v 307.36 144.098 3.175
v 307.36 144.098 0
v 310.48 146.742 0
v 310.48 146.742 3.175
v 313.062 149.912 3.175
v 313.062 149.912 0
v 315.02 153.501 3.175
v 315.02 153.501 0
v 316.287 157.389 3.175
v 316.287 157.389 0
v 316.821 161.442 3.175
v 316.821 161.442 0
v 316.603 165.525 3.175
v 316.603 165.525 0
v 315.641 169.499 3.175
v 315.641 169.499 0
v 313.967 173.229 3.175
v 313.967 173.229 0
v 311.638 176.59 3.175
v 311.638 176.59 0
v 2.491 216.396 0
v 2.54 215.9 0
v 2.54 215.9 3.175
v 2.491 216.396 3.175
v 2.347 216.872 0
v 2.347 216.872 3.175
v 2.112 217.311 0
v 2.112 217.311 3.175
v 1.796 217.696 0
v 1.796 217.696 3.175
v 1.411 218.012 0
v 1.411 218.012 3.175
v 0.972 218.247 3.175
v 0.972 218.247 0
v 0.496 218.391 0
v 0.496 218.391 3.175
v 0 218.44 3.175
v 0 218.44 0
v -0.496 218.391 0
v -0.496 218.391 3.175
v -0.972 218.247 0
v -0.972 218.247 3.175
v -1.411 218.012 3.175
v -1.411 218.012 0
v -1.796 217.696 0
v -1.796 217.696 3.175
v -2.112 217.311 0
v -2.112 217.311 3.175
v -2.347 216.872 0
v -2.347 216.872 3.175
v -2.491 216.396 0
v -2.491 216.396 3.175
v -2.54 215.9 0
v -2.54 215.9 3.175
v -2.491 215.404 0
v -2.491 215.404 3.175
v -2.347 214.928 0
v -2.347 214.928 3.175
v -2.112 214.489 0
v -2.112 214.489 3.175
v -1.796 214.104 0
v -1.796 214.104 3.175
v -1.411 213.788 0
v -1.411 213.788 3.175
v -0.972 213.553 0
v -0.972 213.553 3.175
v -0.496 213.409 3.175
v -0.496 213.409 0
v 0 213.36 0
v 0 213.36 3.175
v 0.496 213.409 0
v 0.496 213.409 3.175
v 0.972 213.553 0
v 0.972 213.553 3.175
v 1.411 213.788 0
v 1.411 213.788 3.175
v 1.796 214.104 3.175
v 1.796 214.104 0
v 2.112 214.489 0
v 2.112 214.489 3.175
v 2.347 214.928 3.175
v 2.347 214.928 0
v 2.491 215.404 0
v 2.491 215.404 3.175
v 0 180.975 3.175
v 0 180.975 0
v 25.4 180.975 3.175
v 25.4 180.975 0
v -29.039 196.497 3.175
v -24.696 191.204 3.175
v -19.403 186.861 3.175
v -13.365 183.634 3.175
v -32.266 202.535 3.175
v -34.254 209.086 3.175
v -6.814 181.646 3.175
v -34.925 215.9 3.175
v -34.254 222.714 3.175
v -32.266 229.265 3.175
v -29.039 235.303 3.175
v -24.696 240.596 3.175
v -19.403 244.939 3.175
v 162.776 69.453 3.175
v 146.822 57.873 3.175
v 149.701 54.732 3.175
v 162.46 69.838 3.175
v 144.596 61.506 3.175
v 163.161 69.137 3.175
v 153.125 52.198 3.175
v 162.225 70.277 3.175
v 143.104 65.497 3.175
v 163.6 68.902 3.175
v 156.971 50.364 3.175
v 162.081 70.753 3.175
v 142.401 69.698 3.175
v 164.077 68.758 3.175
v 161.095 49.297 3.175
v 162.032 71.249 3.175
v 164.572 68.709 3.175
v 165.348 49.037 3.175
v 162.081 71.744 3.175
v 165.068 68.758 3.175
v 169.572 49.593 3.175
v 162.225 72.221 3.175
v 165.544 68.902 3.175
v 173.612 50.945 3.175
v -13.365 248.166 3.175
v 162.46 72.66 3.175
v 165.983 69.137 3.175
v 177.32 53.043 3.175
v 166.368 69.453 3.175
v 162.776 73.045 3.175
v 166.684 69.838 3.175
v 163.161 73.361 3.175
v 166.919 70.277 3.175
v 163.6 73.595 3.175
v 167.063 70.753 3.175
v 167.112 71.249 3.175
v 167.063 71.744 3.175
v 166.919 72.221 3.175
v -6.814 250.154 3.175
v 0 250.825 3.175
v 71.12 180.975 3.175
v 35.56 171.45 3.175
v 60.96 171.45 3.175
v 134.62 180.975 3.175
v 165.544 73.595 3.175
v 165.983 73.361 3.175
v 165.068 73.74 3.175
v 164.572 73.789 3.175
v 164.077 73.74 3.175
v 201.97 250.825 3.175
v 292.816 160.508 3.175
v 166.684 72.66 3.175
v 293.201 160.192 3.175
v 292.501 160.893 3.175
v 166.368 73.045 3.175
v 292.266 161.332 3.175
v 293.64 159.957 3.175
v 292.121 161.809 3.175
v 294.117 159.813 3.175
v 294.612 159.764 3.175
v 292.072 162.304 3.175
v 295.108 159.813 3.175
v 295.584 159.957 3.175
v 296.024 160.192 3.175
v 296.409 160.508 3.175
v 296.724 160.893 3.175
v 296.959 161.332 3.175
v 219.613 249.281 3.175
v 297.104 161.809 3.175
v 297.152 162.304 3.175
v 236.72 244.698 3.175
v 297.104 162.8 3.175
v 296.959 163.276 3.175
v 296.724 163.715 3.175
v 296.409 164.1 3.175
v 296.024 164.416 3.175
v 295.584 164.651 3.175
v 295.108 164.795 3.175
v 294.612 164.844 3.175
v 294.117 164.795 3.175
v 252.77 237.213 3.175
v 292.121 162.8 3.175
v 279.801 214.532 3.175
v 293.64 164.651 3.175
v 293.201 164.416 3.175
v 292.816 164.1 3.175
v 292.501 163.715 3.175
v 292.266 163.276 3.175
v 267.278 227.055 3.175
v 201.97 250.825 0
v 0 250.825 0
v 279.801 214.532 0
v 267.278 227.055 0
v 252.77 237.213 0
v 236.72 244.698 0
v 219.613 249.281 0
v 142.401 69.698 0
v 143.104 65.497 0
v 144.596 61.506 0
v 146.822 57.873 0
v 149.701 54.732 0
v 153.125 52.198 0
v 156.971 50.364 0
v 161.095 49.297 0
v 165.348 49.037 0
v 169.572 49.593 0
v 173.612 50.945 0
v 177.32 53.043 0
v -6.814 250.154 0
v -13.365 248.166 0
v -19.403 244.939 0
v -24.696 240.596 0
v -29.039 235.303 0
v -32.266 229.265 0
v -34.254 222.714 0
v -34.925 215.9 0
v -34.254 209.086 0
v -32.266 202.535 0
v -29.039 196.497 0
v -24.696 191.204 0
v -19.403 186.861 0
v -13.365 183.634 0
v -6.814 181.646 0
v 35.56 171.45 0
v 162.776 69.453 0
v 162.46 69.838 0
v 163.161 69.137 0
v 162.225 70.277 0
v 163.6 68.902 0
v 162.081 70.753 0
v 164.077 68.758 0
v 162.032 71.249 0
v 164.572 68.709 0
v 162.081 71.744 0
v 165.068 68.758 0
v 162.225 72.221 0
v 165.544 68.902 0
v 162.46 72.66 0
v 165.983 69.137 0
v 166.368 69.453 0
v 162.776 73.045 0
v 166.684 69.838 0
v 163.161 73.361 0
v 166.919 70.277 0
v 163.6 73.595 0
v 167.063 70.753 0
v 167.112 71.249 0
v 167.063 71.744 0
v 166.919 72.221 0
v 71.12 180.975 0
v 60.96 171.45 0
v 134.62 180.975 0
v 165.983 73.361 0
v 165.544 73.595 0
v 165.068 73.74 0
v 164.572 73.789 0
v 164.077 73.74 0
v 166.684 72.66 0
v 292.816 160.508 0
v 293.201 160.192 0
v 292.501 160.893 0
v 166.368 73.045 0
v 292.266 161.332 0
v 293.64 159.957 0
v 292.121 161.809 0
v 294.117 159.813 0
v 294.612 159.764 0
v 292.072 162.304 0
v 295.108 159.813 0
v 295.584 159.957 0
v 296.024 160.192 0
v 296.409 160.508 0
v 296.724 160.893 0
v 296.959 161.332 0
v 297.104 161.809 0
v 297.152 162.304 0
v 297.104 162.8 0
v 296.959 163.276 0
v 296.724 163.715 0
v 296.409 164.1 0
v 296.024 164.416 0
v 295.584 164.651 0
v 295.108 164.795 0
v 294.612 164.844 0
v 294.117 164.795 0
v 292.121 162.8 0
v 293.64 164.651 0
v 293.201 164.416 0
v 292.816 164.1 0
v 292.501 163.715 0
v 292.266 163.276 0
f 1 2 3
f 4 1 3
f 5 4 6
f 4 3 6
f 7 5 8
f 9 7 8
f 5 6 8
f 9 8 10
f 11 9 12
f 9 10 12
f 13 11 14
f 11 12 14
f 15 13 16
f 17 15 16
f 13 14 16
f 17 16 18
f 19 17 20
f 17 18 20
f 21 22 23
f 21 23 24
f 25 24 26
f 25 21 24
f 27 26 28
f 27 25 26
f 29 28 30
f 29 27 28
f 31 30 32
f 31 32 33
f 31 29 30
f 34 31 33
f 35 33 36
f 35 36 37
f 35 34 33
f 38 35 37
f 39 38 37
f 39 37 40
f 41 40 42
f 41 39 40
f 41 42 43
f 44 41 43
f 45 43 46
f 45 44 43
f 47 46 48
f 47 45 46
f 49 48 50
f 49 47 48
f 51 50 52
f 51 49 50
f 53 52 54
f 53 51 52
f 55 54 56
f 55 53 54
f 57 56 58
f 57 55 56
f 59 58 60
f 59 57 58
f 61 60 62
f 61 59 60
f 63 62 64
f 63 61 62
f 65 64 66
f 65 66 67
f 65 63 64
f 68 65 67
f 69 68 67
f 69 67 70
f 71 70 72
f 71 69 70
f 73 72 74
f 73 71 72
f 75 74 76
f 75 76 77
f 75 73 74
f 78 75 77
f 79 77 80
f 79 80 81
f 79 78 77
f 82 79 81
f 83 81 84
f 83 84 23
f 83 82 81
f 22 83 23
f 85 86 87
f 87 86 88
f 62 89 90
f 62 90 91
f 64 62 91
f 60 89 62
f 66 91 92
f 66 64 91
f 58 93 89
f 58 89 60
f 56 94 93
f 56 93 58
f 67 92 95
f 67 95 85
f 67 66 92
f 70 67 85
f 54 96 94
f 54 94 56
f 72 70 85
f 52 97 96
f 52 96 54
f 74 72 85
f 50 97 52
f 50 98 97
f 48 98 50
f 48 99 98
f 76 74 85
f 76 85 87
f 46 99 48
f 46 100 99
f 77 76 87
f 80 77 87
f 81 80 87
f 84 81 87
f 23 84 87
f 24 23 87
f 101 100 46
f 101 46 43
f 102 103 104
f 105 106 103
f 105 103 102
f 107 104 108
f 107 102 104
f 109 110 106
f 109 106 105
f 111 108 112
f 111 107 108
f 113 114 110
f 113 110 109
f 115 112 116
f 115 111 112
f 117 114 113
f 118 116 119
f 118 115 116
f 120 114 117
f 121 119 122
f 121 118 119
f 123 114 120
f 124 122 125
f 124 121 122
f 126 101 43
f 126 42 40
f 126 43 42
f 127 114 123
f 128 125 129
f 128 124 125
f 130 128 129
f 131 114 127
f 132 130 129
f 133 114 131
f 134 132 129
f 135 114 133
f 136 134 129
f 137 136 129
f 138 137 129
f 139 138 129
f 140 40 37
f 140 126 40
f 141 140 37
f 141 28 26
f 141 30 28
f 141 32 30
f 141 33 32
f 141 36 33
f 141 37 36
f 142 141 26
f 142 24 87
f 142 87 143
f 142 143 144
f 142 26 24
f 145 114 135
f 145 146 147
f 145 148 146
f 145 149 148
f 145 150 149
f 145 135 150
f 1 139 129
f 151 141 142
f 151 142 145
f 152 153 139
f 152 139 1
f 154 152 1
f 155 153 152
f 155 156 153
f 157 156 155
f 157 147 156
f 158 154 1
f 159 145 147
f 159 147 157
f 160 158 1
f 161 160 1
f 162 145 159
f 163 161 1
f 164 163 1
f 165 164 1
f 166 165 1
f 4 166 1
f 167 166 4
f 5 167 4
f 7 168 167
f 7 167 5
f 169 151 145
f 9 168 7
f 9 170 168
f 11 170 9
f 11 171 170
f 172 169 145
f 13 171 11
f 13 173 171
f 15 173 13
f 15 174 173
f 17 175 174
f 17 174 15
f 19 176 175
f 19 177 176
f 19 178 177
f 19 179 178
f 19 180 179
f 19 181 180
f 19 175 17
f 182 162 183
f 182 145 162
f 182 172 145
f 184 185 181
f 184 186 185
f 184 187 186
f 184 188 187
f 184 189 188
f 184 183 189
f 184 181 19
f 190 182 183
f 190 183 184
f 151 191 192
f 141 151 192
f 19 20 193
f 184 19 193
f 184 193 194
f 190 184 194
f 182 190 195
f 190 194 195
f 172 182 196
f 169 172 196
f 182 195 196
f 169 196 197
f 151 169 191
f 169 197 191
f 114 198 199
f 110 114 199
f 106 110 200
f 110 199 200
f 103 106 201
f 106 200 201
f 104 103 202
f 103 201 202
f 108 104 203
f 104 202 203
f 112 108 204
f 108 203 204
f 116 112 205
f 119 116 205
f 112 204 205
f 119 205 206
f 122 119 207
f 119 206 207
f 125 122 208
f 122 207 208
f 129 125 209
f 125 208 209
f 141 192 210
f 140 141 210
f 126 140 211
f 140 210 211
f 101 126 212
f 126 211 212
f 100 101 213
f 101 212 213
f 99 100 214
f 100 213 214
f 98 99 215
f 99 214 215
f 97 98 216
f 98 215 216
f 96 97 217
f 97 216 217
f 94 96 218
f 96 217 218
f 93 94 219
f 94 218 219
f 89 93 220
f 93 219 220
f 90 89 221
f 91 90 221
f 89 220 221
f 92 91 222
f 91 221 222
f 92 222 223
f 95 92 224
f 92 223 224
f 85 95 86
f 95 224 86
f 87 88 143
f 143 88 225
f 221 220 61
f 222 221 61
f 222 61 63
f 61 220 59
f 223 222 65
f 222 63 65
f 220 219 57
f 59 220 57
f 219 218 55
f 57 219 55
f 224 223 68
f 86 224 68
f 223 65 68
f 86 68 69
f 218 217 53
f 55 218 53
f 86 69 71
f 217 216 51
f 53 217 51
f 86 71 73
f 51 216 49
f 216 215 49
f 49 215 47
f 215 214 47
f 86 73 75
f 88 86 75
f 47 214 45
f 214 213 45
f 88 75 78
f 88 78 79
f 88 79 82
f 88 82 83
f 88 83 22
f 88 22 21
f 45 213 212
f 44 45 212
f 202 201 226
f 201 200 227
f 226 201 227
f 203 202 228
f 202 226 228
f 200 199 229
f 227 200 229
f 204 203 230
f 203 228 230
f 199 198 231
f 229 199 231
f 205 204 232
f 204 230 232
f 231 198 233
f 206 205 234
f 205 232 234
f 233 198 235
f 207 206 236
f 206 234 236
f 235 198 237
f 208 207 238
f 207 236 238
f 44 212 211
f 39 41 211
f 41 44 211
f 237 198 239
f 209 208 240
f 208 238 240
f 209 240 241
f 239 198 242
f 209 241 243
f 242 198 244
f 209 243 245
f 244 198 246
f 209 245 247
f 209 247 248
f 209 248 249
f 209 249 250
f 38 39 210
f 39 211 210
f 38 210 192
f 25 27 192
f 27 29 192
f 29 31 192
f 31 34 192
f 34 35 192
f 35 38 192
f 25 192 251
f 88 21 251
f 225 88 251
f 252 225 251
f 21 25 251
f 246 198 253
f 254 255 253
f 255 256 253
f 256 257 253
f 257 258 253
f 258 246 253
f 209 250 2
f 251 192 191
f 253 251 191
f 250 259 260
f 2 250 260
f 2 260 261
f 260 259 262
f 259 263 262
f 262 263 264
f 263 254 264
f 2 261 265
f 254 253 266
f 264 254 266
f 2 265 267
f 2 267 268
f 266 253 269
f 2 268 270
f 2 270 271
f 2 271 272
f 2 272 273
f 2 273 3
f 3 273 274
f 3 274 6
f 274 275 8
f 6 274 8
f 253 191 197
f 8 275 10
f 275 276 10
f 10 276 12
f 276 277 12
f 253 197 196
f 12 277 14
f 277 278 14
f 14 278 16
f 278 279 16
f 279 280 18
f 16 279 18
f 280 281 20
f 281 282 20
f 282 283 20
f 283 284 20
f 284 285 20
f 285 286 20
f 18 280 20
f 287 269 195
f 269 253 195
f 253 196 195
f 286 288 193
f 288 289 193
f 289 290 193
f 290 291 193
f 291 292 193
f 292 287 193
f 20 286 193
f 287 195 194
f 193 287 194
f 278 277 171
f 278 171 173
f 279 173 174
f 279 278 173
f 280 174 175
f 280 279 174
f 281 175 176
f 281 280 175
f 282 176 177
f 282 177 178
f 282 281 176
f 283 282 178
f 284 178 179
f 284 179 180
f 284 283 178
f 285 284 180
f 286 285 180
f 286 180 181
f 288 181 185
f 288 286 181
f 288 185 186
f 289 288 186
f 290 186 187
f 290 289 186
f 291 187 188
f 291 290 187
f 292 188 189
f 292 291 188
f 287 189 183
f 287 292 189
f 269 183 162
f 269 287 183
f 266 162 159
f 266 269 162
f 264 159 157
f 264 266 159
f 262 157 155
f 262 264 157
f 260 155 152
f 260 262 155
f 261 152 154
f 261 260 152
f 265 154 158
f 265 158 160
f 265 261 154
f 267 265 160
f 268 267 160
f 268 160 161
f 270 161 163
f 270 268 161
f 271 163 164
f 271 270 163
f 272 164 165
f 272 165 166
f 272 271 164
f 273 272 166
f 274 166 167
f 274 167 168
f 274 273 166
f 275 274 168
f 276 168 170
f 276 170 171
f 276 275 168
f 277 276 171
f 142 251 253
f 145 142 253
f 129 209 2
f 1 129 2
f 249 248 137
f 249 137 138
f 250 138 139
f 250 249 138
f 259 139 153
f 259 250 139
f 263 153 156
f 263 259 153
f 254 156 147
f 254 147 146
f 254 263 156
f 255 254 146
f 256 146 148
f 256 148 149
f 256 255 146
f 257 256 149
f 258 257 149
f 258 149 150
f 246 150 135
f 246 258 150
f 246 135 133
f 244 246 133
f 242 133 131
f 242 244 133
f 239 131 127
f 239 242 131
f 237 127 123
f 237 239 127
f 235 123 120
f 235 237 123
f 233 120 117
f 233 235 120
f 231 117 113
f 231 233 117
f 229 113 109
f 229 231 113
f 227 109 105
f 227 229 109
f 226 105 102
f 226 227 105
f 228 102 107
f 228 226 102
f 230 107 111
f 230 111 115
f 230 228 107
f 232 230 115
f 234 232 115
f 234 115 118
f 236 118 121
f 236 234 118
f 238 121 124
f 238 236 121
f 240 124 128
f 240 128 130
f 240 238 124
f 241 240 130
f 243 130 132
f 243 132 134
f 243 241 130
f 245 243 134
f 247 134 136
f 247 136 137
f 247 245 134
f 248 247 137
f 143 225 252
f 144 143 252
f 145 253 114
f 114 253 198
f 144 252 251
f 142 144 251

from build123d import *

# Parameters (mm, degrees)
SKETCH1_R           = 2.54
BOSS_EXTRUDE1_DEPTH = 3.175


with BuildPart() as part:
    # Sketch1 → Boss-Extrude1 (new body)
    with BuildSketch(Plane.XY):
        with BuildLine():
            Line((134.62, 180.975), (142.401211704, 69.698488351))
            ThreePointArc((142.401211704, 69.698488351), (155.003963594, 51.188868036), (177.319809019, 53.043171796))
            Line((177.319809019, 53.043171796), (307.36019605, 144.098431067))
            ThreePointArc((307.36019605, 144.098431067), (316.647321796, 159.403140629), (311.6377975, 176.590039876))
            Line((311.6377975, 176.590039876), (279.800527192, 214.532221144))
            ThreePointArc((279.800527192, 214.532221144), (244.908427164, 241.305871163), (201.970411771, 250.825))
            Line((201.970411771, 250.825), (0, 250.825))
            ThreePointArc((0, 250.825), (-34.925, 215.9), (0, 180.975))
            Line((0, 180.975), (25.4, 180.975))
            Line((25.4, 180.975), (35.56, 171.45))
            Line((35.56, 171.45), (60.96, 171.45))
            Line((60.96, 171.45), (71.12, 180.975))
            Line((71.12, 180.975), (134.62, 180.975))
        make_face()
        with Locations((294.612459752, 162.304085251)):
            Circle(SKETCH1_R, mode=Mode.SUBTRACT)
        with Locations((164.572072721, 71.24882598)):
            Circle(SKETCH1_R, mode=Mode.SUBTRACT)
        with Locations((0, 215.9)):
            Circle(SKETCH1_R, mode=Mode.SUBTRACT)
    extrude(amount=BOSS_EXTRUDE1_DEPTH)


solid = part.part
